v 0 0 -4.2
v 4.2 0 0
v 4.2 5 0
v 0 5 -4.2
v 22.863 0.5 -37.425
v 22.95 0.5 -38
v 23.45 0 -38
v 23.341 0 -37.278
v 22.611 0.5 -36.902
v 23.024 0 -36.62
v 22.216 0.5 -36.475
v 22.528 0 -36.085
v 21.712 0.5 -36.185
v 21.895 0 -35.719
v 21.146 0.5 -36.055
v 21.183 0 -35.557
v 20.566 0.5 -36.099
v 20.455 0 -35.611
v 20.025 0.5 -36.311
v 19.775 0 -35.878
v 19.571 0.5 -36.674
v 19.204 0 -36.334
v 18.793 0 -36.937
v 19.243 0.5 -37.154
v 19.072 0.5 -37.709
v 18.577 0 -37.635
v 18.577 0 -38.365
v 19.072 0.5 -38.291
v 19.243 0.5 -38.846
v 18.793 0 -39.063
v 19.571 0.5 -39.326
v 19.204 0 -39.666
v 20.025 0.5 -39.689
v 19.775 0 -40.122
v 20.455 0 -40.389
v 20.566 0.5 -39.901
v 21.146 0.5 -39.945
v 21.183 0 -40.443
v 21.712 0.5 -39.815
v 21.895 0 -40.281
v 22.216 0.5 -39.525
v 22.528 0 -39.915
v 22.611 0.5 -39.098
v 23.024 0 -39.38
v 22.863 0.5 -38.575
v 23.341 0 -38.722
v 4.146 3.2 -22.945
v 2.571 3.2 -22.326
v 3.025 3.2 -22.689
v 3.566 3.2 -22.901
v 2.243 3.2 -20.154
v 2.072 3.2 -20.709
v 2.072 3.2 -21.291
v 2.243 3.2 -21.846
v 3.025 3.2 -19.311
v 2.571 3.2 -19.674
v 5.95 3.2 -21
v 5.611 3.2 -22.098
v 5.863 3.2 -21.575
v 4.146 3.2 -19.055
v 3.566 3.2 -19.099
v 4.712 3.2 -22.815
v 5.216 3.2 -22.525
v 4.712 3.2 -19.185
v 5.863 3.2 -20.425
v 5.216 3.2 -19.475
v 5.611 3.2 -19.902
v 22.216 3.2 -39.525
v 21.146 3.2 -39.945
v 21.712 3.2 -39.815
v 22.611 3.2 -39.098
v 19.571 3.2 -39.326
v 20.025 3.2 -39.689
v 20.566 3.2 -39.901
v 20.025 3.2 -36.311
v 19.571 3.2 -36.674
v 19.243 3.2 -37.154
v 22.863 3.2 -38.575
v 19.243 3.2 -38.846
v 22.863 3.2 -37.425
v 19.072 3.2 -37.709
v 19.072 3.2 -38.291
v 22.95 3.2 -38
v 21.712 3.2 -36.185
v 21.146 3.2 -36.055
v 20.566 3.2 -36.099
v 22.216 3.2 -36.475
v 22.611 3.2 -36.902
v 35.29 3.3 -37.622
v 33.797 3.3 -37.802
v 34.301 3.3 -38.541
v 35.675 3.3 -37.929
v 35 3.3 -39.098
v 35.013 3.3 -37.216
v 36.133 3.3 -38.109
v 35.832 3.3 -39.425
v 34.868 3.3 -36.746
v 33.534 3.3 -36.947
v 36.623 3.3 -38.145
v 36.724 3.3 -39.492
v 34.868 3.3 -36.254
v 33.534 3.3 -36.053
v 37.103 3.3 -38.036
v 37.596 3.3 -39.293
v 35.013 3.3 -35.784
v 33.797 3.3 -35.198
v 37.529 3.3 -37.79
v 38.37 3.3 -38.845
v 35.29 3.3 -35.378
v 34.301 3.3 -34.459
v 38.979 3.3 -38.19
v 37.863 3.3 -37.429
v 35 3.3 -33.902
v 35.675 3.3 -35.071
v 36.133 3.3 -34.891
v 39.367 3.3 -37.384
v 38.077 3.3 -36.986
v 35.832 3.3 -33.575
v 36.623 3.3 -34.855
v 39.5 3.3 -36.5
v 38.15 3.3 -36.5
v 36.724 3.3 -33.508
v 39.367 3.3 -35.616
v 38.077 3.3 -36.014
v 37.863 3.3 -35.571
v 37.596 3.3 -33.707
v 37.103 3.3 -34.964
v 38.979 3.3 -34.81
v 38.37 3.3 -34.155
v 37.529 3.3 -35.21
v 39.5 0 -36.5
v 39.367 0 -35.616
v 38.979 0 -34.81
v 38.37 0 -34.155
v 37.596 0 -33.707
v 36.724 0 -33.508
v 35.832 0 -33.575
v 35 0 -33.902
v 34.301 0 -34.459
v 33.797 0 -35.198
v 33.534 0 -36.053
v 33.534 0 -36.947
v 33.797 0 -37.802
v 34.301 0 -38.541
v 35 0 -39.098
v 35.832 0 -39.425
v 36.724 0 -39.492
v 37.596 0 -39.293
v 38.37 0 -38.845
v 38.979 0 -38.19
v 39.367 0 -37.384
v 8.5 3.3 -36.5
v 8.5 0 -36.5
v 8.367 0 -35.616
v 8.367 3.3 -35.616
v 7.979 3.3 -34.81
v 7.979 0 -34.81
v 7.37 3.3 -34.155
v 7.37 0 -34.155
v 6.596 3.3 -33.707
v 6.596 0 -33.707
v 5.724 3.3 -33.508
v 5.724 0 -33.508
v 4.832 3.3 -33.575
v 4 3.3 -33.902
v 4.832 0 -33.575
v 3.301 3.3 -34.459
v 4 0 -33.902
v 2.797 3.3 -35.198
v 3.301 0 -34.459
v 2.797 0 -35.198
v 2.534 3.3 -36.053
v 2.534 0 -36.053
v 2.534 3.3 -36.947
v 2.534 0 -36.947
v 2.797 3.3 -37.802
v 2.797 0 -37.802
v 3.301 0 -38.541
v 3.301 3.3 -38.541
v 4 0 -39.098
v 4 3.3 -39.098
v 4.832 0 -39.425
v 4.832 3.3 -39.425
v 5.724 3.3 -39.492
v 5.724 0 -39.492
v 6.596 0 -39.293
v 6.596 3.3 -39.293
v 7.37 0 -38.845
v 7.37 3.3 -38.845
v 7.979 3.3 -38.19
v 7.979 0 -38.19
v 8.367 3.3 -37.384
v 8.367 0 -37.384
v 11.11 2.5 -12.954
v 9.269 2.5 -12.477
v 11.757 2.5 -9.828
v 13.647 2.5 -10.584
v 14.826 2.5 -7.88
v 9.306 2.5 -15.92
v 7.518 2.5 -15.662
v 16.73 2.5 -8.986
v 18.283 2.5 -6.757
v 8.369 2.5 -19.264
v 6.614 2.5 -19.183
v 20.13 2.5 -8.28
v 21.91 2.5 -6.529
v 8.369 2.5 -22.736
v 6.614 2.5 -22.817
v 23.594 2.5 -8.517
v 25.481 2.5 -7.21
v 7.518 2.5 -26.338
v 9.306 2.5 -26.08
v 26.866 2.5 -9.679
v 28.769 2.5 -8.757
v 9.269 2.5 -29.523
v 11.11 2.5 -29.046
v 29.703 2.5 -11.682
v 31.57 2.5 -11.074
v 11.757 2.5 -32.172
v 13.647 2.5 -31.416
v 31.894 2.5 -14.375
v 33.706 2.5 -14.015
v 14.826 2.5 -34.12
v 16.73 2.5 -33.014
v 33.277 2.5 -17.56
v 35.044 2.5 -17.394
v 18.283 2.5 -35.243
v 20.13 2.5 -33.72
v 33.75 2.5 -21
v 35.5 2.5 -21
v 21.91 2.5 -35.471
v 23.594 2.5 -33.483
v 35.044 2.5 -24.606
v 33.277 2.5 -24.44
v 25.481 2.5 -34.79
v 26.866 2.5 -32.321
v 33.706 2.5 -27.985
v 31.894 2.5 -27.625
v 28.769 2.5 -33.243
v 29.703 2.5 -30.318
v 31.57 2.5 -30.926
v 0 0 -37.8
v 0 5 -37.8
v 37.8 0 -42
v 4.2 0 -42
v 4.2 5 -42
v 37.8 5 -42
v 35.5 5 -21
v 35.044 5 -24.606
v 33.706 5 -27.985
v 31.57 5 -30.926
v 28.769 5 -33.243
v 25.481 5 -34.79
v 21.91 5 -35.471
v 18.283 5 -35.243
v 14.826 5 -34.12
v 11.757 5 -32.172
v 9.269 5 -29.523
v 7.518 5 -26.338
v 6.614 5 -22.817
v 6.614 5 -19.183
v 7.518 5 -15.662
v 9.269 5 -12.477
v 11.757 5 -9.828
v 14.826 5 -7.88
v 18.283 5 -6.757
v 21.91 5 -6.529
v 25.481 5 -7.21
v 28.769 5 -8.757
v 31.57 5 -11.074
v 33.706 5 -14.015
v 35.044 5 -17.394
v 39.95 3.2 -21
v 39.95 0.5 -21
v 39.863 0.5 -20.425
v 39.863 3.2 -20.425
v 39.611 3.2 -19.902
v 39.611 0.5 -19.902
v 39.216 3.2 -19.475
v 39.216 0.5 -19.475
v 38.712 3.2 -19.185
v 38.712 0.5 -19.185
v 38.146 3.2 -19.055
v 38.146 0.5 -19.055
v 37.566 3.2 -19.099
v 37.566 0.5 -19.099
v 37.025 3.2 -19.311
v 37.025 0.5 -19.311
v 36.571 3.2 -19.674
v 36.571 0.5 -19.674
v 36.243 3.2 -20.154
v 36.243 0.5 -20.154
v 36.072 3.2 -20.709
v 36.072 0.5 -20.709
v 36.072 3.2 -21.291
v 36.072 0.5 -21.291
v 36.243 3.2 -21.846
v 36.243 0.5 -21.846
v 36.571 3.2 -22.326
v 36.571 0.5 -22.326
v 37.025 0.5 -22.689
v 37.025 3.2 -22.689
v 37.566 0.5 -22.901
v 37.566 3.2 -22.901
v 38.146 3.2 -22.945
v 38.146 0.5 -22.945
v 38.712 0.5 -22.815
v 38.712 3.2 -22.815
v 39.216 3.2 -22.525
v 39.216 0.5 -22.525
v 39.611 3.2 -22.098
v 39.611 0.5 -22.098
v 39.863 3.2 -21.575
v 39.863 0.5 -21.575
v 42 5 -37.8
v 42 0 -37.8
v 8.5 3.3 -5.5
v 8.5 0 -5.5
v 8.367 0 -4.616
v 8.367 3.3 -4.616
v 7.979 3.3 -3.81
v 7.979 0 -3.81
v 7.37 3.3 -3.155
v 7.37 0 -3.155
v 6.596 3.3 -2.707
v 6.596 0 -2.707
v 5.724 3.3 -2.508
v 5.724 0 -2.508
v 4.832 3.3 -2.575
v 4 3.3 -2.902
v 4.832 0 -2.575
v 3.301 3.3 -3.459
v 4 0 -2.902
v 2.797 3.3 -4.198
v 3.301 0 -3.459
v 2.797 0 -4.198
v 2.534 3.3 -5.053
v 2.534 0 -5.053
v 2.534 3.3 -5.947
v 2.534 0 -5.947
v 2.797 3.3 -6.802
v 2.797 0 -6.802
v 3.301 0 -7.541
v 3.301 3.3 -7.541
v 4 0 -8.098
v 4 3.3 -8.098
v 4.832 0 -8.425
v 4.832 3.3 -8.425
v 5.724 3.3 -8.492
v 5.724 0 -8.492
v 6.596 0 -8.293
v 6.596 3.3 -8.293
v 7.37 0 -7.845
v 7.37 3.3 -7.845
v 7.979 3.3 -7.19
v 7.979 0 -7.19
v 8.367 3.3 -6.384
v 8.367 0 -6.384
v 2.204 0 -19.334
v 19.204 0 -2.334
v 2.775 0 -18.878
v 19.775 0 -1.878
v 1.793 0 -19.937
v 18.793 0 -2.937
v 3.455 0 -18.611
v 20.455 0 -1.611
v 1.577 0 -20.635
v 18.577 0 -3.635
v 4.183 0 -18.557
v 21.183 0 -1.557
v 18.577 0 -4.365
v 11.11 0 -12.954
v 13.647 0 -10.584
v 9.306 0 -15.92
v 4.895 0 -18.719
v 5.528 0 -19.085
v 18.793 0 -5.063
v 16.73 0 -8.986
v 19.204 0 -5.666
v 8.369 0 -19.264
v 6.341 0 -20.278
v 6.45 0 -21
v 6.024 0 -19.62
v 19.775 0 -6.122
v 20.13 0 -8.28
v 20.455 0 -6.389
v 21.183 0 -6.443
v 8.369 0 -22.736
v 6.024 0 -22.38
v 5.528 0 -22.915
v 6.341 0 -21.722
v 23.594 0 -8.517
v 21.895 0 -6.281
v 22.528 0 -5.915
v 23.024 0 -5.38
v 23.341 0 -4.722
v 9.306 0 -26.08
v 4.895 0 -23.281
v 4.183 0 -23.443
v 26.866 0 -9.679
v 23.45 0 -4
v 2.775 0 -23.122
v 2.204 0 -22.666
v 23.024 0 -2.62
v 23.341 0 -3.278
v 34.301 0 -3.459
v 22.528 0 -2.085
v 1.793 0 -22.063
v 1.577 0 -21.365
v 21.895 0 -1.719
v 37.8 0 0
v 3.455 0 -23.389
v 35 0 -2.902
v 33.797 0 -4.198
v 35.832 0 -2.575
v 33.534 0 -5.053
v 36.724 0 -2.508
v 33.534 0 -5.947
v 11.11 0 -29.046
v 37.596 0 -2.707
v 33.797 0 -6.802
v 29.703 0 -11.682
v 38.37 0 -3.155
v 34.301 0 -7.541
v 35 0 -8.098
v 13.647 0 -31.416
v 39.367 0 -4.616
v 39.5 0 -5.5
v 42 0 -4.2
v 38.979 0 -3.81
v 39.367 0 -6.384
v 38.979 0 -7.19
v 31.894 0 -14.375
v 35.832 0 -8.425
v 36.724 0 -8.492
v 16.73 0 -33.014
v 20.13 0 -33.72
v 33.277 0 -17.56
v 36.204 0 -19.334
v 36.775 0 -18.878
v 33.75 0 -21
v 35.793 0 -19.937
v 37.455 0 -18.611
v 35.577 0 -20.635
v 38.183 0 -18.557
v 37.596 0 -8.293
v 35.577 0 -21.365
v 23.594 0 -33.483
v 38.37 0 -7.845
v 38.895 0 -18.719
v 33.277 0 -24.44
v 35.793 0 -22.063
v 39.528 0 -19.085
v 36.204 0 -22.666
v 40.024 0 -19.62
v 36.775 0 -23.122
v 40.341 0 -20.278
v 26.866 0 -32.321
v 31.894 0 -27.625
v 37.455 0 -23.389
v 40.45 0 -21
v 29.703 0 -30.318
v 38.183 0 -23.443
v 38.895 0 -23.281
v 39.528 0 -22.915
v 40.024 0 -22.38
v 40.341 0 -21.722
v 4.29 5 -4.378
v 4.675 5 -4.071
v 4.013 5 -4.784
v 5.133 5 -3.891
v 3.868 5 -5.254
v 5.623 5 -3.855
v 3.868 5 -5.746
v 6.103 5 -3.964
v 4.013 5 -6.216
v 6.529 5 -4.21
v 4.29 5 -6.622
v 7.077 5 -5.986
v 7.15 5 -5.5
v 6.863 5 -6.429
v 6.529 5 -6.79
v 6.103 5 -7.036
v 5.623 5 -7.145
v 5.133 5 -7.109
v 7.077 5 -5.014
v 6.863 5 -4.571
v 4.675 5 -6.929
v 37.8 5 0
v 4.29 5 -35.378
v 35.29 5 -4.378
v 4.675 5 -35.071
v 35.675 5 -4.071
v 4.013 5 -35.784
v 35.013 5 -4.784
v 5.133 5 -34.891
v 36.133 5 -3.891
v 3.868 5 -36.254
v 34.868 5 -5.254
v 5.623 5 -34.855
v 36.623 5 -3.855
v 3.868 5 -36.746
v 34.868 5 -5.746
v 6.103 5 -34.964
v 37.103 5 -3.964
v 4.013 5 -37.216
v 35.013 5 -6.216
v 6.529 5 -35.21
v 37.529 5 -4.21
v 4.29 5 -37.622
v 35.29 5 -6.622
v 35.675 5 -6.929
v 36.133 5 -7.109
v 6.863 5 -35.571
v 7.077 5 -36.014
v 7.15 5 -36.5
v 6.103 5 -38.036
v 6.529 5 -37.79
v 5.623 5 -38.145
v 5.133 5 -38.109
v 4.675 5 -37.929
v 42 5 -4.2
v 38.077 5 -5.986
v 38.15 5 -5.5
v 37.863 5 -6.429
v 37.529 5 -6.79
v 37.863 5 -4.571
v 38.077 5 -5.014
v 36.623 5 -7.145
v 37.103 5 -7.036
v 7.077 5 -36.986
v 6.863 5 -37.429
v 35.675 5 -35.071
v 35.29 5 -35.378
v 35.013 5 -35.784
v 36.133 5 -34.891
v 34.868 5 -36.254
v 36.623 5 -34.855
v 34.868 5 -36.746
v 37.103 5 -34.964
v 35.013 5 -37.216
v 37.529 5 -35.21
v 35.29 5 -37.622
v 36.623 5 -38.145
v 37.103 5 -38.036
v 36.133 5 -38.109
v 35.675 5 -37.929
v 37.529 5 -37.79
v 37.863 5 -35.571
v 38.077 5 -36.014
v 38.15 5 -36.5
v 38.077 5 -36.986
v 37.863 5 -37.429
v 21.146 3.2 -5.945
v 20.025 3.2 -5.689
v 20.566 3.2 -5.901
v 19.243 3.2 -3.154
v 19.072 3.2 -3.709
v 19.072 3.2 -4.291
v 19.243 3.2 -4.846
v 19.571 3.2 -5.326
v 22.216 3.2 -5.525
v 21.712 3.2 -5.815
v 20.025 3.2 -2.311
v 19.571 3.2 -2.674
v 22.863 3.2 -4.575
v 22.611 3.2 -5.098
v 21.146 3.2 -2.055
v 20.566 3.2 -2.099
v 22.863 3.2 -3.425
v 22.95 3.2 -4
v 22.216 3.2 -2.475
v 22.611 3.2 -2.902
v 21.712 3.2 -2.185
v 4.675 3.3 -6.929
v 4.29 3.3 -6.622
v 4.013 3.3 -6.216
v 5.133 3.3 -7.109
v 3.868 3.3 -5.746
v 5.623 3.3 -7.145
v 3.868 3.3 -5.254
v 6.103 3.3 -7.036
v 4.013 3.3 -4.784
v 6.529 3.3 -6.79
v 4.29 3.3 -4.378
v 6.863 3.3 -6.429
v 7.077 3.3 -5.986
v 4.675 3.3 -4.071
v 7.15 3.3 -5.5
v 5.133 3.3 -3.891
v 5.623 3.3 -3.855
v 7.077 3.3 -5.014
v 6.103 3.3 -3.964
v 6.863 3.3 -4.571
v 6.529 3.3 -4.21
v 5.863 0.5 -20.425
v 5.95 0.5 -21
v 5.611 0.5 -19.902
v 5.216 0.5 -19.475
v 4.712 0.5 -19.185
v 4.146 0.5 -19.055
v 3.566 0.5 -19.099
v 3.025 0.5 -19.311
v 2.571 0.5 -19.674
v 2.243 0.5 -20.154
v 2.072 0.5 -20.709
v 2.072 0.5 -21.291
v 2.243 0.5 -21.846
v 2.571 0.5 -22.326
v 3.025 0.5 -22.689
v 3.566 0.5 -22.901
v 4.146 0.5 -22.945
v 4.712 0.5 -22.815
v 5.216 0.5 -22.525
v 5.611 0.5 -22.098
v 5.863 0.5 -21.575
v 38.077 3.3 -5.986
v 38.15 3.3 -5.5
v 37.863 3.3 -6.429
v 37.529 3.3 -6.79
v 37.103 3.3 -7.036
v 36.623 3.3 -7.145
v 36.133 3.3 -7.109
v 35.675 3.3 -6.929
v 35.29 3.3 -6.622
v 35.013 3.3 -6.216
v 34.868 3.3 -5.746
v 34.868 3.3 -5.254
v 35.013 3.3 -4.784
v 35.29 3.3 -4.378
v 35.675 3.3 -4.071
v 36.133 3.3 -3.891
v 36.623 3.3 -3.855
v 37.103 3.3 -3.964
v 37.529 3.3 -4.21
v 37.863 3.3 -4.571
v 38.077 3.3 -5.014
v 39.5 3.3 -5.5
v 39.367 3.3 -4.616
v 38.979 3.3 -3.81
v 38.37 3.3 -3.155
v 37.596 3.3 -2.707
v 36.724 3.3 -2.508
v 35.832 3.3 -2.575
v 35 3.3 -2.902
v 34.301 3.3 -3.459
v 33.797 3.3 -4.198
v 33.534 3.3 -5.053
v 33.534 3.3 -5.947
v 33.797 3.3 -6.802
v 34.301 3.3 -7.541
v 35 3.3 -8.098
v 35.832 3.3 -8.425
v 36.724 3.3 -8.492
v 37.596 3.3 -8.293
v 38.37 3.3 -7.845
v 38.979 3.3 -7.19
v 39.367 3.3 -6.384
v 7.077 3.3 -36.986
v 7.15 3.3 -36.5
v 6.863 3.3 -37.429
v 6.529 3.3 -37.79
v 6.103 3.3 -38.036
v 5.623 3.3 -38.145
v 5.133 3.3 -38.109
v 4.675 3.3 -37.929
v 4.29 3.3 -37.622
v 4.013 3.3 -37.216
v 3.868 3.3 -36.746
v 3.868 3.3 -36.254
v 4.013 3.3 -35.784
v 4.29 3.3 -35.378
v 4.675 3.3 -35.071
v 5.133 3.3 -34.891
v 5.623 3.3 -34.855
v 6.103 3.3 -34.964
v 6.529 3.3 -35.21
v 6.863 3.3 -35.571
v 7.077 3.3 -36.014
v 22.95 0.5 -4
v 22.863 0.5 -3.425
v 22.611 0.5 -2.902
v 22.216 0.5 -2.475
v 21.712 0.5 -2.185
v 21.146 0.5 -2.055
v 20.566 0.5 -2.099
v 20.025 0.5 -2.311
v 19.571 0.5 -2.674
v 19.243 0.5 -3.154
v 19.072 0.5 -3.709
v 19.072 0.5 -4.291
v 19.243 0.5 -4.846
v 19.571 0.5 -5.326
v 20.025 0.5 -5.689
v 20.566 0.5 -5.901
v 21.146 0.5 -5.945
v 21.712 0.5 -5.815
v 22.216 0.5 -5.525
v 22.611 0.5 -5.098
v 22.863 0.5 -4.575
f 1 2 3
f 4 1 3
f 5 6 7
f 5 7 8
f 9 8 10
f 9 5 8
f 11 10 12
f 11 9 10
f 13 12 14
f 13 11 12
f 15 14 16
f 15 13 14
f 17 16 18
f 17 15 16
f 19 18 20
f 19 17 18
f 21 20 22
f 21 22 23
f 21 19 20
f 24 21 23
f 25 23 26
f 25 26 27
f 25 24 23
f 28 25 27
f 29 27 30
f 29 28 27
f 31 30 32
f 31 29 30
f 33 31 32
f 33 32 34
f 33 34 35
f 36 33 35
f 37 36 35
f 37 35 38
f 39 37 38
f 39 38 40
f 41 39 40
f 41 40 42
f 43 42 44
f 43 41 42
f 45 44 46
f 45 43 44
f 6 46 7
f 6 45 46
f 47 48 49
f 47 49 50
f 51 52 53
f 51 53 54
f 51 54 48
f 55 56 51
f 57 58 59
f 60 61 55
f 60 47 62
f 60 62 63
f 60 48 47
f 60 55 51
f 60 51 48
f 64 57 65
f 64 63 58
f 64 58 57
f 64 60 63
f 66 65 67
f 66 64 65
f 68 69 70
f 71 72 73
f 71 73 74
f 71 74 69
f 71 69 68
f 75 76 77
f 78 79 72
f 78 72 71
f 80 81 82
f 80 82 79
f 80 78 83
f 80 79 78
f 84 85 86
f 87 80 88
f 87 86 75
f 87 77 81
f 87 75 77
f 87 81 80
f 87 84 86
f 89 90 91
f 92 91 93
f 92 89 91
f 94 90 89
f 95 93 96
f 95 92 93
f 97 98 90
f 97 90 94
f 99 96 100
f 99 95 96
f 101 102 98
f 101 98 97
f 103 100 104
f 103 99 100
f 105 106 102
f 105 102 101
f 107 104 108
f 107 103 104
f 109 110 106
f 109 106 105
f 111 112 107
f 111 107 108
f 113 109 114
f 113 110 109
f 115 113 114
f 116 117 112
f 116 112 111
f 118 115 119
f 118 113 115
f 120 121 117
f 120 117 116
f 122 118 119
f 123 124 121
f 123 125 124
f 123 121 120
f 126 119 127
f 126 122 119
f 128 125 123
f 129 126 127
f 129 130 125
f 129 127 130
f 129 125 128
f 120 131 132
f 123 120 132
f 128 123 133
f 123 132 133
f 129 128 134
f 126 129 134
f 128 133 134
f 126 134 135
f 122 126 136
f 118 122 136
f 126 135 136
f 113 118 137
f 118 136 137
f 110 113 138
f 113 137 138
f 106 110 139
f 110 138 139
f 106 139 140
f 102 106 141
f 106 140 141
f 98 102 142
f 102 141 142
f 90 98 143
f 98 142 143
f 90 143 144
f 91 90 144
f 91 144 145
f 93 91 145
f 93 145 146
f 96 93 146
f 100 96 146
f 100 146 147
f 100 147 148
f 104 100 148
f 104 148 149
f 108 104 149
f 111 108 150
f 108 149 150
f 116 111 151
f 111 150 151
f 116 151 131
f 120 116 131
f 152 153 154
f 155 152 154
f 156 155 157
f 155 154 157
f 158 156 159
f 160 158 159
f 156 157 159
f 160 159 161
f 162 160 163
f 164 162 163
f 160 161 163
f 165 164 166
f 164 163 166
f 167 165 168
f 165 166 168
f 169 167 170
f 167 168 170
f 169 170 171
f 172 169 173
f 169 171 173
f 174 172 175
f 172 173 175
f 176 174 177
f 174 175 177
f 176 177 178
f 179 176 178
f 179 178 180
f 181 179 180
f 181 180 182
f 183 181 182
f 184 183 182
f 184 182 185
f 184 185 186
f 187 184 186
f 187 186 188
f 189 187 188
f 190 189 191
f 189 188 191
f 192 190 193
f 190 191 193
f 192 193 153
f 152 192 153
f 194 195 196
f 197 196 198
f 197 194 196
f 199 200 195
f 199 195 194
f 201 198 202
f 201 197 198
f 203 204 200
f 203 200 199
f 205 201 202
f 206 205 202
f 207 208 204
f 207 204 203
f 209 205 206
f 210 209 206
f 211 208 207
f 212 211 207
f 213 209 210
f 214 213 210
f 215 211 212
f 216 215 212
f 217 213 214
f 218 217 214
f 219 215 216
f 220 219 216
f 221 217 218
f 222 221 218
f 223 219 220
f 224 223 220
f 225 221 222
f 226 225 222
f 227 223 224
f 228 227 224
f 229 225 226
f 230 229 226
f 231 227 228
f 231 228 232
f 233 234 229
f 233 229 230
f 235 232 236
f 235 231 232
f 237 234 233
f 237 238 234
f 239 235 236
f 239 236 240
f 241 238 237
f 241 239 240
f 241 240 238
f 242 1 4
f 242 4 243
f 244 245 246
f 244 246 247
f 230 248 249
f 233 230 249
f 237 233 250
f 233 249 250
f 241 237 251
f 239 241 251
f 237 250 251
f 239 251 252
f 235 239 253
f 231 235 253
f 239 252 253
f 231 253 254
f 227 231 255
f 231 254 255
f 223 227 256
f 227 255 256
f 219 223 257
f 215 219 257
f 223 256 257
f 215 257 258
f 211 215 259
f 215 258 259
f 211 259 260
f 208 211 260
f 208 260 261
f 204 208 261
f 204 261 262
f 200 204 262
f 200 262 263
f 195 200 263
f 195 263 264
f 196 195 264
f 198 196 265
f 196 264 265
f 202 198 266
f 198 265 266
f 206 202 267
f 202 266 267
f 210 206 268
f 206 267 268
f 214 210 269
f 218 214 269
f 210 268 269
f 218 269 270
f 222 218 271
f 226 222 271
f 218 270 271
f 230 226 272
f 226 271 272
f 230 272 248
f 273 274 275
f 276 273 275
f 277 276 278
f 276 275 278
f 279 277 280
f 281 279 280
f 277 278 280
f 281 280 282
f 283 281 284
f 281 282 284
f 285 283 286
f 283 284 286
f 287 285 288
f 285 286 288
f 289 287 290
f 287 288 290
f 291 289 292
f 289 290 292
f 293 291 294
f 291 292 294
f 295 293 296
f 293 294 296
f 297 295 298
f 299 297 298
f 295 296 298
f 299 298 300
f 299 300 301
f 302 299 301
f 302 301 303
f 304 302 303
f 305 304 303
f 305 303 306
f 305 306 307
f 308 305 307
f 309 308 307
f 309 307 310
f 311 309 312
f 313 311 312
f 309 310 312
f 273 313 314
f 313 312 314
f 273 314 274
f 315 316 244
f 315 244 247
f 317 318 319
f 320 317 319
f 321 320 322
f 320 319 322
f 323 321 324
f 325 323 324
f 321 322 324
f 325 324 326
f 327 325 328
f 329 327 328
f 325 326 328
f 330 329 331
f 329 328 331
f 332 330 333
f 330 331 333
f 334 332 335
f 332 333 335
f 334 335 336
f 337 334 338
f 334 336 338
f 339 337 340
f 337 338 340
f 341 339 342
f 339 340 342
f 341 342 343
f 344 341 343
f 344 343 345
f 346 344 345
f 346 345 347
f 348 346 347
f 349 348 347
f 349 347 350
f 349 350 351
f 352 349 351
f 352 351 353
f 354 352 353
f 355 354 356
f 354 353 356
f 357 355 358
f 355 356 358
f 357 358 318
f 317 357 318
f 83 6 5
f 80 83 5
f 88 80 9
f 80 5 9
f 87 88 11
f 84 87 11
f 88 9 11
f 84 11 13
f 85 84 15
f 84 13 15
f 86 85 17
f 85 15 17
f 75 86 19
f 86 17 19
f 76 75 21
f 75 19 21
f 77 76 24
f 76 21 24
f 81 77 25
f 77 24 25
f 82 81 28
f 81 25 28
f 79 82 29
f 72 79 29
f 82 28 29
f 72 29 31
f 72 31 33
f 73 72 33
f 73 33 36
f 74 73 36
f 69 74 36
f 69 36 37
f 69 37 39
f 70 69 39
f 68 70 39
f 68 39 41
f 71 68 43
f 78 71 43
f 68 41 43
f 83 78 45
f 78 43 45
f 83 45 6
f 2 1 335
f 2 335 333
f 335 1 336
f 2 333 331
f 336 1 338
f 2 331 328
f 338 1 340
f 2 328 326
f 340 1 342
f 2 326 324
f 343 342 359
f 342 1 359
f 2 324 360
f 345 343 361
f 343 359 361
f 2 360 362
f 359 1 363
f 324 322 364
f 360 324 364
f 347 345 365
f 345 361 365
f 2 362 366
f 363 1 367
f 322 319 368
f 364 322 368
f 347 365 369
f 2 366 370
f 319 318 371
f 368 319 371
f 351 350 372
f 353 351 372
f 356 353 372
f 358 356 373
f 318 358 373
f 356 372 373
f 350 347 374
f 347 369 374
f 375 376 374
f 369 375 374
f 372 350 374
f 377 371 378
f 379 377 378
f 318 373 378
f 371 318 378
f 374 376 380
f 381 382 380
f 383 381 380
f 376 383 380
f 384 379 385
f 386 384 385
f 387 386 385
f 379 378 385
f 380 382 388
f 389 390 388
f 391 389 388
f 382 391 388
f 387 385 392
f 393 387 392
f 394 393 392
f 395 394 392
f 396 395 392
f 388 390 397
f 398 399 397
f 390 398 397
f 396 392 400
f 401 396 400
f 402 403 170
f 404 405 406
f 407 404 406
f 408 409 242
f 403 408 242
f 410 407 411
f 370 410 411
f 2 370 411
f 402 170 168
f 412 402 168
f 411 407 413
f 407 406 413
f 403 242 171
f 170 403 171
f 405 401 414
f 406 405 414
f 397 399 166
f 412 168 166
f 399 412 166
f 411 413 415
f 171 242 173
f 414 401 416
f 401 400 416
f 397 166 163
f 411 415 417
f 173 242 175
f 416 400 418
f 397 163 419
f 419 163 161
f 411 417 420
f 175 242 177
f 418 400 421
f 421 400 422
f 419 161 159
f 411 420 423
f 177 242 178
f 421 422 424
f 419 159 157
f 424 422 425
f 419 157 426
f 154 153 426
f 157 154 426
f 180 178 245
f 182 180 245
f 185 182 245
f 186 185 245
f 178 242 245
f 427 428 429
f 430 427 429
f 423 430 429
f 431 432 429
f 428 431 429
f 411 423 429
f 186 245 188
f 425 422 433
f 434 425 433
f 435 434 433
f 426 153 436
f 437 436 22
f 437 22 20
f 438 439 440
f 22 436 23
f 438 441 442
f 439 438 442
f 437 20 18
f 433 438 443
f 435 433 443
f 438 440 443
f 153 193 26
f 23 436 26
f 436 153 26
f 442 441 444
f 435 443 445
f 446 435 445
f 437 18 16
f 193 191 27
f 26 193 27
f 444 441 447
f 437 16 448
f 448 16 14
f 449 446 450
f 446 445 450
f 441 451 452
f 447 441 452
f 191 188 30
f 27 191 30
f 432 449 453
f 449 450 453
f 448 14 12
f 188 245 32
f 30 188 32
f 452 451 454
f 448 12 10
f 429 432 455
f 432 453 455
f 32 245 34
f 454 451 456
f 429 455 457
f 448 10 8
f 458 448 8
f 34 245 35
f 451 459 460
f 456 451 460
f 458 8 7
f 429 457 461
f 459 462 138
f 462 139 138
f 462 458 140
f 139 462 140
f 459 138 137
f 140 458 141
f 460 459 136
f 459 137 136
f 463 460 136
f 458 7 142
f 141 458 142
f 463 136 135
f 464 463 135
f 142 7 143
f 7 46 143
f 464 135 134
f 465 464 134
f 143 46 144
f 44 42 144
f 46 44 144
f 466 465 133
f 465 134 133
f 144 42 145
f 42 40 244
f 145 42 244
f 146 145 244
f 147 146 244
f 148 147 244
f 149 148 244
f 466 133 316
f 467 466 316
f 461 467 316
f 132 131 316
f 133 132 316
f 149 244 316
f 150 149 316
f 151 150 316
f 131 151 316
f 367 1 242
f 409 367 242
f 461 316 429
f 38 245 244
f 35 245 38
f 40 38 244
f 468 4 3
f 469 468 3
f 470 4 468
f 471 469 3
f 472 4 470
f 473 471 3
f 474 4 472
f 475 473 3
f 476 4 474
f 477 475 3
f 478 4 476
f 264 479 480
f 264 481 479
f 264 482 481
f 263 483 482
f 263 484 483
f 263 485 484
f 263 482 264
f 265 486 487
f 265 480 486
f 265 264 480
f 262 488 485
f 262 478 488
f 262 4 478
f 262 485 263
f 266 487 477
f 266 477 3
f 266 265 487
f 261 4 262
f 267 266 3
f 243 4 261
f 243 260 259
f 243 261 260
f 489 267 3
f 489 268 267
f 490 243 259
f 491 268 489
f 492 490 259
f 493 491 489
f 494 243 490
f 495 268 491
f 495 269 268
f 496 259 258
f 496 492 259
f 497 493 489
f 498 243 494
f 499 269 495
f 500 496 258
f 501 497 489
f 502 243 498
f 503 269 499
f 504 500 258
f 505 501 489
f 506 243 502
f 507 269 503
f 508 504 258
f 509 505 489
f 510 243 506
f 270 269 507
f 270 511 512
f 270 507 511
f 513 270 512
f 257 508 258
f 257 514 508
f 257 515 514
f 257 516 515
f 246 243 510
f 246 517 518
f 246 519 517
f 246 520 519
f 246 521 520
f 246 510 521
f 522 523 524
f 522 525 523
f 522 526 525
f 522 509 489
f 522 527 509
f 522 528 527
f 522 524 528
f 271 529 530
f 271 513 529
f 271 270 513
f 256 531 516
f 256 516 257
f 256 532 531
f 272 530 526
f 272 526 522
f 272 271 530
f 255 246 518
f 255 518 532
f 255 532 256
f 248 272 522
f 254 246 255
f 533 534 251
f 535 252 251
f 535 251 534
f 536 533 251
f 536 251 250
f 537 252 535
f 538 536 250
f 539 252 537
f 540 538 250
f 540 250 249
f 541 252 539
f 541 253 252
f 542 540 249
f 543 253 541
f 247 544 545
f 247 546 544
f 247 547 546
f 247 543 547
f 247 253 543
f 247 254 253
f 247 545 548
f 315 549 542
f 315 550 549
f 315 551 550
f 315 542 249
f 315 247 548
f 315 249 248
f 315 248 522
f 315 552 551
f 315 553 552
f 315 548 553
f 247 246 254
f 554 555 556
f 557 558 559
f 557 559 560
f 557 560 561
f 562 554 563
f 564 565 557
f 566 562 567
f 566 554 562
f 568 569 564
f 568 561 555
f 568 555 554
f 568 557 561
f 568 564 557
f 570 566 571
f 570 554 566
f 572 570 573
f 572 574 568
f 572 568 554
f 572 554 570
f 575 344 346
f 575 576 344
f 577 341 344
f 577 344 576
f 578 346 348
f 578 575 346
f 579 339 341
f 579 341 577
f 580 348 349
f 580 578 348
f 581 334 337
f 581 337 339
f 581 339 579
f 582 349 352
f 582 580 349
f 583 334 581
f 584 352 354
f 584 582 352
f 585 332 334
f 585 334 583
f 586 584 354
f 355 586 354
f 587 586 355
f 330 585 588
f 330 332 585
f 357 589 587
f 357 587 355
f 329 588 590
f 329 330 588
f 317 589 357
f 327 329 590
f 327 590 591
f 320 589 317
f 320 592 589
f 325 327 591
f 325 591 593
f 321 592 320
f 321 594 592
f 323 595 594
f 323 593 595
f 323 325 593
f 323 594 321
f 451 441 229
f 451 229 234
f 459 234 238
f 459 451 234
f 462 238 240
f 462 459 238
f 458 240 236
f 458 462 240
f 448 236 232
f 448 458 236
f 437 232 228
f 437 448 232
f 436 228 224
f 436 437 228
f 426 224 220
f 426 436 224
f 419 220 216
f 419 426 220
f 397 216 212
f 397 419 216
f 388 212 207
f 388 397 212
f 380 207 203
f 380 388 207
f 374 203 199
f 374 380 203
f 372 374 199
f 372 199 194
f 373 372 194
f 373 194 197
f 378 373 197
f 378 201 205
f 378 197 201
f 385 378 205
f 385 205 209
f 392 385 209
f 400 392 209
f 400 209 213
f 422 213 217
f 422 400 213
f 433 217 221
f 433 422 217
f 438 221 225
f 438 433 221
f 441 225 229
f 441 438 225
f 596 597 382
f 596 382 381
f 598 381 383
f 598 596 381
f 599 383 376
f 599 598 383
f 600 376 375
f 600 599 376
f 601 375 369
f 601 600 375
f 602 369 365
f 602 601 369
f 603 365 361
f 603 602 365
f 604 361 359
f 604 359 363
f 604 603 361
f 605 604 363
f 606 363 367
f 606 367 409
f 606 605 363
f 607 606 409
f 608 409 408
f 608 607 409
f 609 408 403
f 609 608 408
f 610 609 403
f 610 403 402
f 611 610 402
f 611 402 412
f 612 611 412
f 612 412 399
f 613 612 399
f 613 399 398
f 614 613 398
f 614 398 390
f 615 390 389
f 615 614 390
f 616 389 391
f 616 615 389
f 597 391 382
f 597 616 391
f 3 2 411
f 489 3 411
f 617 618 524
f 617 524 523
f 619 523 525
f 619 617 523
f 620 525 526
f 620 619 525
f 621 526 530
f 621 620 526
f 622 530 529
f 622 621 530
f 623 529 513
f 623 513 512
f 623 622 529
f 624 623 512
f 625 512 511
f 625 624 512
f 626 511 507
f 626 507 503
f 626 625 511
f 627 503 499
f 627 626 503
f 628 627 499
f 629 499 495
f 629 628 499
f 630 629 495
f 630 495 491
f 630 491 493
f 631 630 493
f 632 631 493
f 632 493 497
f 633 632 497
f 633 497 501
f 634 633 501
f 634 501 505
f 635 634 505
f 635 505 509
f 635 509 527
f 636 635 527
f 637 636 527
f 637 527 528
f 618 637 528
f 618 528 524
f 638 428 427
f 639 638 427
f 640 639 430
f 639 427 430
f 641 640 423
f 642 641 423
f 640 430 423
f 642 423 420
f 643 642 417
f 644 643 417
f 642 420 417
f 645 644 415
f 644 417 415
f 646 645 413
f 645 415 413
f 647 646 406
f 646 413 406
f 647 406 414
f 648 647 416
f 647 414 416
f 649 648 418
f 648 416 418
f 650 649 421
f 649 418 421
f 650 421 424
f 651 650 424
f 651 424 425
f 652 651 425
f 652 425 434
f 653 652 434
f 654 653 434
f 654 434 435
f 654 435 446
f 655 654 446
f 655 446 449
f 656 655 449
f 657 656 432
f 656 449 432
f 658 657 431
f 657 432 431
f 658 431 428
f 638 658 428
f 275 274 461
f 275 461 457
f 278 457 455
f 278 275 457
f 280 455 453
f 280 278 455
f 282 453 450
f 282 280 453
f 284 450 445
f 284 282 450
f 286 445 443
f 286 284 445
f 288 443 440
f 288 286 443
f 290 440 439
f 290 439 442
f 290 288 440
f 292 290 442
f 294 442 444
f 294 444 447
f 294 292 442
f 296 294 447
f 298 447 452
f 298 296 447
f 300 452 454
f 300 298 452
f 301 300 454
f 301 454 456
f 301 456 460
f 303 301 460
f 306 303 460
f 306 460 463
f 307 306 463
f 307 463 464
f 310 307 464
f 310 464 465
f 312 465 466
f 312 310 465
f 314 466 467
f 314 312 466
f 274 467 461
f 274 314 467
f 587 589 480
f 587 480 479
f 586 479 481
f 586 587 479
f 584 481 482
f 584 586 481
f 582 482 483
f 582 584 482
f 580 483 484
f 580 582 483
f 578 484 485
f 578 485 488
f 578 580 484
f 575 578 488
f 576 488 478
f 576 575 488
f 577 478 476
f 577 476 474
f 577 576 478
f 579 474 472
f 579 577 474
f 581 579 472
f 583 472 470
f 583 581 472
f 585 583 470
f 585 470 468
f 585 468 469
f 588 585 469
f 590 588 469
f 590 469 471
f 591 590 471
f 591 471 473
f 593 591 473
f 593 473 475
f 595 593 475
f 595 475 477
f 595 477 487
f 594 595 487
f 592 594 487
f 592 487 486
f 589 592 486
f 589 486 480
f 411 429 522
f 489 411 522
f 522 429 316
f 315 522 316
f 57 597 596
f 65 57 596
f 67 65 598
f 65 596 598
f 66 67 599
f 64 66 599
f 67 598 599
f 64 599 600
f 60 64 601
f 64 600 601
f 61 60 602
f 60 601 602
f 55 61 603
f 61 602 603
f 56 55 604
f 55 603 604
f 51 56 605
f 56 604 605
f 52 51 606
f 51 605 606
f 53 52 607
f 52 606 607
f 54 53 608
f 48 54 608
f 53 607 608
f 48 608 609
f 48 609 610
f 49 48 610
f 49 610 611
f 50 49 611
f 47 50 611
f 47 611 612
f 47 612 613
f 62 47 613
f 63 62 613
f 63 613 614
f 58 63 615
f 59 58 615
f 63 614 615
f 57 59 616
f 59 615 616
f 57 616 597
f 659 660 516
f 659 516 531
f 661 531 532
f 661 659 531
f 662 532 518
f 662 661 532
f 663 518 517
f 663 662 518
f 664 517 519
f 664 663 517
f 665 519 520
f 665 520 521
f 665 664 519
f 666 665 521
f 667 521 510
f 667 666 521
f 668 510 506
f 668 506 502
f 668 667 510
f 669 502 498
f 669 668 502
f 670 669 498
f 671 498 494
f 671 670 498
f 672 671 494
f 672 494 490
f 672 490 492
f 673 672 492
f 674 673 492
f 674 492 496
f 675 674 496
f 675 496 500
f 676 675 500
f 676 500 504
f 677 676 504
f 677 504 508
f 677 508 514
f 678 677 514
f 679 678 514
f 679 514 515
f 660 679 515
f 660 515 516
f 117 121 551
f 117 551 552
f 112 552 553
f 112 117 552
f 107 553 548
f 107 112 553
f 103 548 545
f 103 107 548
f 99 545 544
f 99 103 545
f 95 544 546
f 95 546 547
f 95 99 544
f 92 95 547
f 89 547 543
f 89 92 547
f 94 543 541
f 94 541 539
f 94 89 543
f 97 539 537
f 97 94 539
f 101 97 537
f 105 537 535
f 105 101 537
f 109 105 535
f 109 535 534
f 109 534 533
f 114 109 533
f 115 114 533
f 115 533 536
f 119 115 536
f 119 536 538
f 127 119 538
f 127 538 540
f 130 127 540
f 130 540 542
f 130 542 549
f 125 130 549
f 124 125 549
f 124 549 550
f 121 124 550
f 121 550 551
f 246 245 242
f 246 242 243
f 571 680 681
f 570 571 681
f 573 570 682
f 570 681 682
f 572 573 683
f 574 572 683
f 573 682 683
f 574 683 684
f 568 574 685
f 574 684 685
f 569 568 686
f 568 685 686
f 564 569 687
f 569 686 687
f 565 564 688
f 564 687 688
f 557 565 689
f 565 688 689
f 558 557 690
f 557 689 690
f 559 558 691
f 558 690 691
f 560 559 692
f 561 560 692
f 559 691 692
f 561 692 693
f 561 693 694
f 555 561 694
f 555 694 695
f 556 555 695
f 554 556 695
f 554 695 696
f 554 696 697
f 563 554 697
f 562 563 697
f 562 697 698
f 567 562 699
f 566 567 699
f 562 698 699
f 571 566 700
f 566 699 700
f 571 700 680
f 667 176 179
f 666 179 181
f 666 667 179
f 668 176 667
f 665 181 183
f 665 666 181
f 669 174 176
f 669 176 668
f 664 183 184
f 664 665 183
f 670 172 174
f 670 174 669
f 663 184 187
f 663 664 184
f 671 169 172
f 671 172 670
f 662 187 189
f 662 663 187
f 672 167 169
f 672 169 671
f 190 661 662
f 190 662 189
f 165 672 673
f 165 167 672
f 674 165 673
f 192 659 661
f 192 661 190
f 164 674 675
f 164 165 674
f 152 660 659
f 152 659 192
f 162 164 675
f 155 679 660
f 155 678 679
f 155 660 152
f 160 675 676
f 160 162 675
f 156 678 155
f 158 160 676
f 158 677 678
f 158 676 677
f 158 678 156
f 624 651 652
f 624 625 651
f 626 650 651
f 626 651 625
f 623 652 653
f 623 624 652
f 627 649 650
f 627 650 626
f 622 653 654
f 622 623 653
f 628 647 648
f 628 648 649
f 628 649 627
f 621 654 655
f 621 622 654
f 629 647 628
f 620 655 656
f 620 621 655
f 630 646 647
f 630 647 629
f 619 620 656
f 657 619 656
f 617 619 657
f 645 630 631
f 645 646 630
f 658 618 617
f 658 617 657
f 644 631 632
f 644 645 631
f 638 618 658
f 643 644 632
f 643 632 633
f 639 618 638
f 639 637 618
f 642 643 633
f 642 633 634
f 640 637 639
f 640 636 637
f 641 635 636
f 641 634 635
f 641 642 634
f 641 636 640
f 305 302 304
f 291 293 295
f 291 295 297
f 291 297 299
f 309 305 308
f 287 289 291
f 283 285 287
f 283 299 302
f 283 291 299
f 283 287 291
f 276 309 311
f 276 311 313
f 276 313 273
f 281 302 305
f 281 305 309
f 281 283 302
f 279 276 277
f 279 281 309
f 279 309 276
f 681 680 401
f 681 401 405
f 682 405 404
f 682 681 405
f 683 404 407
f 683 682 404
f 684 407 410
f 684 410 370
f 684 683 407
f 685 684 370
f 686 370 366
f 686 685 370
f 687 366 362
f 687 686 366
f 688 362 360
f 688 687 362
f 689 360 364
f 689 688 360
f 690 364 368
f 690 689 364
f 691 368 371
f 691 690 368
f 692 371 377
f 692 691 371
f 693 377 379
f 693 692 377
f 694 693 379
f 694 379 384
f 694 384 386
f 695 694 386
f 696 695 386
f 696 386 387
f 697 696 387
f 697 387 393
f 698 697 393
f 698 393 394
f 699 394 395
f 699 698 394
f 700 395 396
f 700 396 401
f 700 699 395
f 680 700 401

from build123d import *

# Parameters (mm, degrees)
SKETCH_1_W          = 42
SKETCH_1_H          = 42
SKETCH_1_R          = 1.65
SKETCH_1_R_2        = 12.75
EXTRUDE_1_DEPTH     = 5
SKETCH_2_R          = 14.5
CUT_EXTRUDE_1_DEPTH = 2.5
CHAMFER_1_SIZE      = 4.2
SKETCH_3_R          = 1.95
CUT_EXTRUDE_2_DEPTH = 3.2
CHAMFER_2_SIZE      = 0.5
SKETCH_4_R          = 3
CUT_EXTRUDE_3_DEPTH = 3.3


with BuildPart() as part:
    # 草图1 → 凸台-拉伸1 (new body)
    with BuildSketch(Plane(origin=(0, 0, 0), x_dir=(1, 0, 0), z_dir=(0, 1, 0))):
        with Locations((21, 21)):
            Rectangle(SKETCH_1_W, SKETCH_1_H)
        with Locations((5.5, 5.5)):
            Circle(SKETCH_1_R, mode=Mode.SUBTRACT)
        with Locations((36.5, 5.5)):
            Circle(SKETCH_1_R, mode=Mode.SUBTRACT)
        with Locations((36.5, 36.5)):
            Circle(SKETCH_1_R, mode=Mode.SUBTRACT)
        with Locations((5.5, 36.5)):
            Circle(SKETCH_1_R, mode=Mode.SUBTRACT)
        with Locations((21, 21)):
            Circle(SKETCH_1_R_2, mode=Mode.SUBTRACT)
    extrude(amount=EXTRUDE_1_DEPTH)

    # 草图2 → 切除-拉伸1 (cut)
    with BuildSketch(Plane(origin=(0, 5, 0), x_dir=(1, 0, 0), z_dir=(0, 1, 0))):
        with Locations((21, 21)):
            Circle(SKETCH_2_R)
    extrude(amount=-CUT_EXTRUDE_1_DEPTH, mode=Mode.SUBTRACT)

    # 倒角1
    chamfer_1_edges = [part.edges().sort_by_distance(p)[0] for p in [
        (0, 2.5, -42),
        (42, 2.5, -42),
        (42, 2.5, 0),
        (0, 2.5, 0),
    ]]
    chamfer(chamfer_1_edges, length=CHAMFER_1_SIZE)

    # 草图3 → 切除-拉伸2 (cut)
    with BuildSketch(Plane.XZ):
        with Locations((38, -21)):
            Circle(SKETCH_3_R)
        with Locations((21, -38)):
            Circle(SKETCH_3_R)
        with Locations((4, -21)):
            Circle(SKETCH_3_R)
        with Locations((21, -4)):
            Circle(SKETCH_3_R)
    extrude(amount=-CUT_EXTRUDE_2_DEPTH, mode=Mode.SUBTRACT)

    # 倒角2
    chamfer_2_edges = [part.edges().sort_by_distance(p)[0] for p in [
        (36.05, 0, -21),
        (19.05, 0, -38),
        (2.05, 0, -21),
        (19.05, 0, -4),
    ]]
    chamfer(chamfer_2_edges, length=CHAMFER_2_SIZE)

    # 草图4 → 切除-拉伸3 (cut)
    with BuildSketch(Plane.XZ):
        with Locations((5.5, -5.5)):
            Circle(SKETCH_4_R)
        with Locations((36.5, -5.5)):
            Circle(SKETCH_4_R)
        with Locations((36.5, -36.5)):
            Circle(SKETCH_4_R)
        with Locations((5.5, -36.5)):
            Circle(SKETCH_4_R)
    extrude(amount=-CUT_EXTRUDE_3_DEPTH, mode=Mode.SUBTRACT)


solid = part.part
